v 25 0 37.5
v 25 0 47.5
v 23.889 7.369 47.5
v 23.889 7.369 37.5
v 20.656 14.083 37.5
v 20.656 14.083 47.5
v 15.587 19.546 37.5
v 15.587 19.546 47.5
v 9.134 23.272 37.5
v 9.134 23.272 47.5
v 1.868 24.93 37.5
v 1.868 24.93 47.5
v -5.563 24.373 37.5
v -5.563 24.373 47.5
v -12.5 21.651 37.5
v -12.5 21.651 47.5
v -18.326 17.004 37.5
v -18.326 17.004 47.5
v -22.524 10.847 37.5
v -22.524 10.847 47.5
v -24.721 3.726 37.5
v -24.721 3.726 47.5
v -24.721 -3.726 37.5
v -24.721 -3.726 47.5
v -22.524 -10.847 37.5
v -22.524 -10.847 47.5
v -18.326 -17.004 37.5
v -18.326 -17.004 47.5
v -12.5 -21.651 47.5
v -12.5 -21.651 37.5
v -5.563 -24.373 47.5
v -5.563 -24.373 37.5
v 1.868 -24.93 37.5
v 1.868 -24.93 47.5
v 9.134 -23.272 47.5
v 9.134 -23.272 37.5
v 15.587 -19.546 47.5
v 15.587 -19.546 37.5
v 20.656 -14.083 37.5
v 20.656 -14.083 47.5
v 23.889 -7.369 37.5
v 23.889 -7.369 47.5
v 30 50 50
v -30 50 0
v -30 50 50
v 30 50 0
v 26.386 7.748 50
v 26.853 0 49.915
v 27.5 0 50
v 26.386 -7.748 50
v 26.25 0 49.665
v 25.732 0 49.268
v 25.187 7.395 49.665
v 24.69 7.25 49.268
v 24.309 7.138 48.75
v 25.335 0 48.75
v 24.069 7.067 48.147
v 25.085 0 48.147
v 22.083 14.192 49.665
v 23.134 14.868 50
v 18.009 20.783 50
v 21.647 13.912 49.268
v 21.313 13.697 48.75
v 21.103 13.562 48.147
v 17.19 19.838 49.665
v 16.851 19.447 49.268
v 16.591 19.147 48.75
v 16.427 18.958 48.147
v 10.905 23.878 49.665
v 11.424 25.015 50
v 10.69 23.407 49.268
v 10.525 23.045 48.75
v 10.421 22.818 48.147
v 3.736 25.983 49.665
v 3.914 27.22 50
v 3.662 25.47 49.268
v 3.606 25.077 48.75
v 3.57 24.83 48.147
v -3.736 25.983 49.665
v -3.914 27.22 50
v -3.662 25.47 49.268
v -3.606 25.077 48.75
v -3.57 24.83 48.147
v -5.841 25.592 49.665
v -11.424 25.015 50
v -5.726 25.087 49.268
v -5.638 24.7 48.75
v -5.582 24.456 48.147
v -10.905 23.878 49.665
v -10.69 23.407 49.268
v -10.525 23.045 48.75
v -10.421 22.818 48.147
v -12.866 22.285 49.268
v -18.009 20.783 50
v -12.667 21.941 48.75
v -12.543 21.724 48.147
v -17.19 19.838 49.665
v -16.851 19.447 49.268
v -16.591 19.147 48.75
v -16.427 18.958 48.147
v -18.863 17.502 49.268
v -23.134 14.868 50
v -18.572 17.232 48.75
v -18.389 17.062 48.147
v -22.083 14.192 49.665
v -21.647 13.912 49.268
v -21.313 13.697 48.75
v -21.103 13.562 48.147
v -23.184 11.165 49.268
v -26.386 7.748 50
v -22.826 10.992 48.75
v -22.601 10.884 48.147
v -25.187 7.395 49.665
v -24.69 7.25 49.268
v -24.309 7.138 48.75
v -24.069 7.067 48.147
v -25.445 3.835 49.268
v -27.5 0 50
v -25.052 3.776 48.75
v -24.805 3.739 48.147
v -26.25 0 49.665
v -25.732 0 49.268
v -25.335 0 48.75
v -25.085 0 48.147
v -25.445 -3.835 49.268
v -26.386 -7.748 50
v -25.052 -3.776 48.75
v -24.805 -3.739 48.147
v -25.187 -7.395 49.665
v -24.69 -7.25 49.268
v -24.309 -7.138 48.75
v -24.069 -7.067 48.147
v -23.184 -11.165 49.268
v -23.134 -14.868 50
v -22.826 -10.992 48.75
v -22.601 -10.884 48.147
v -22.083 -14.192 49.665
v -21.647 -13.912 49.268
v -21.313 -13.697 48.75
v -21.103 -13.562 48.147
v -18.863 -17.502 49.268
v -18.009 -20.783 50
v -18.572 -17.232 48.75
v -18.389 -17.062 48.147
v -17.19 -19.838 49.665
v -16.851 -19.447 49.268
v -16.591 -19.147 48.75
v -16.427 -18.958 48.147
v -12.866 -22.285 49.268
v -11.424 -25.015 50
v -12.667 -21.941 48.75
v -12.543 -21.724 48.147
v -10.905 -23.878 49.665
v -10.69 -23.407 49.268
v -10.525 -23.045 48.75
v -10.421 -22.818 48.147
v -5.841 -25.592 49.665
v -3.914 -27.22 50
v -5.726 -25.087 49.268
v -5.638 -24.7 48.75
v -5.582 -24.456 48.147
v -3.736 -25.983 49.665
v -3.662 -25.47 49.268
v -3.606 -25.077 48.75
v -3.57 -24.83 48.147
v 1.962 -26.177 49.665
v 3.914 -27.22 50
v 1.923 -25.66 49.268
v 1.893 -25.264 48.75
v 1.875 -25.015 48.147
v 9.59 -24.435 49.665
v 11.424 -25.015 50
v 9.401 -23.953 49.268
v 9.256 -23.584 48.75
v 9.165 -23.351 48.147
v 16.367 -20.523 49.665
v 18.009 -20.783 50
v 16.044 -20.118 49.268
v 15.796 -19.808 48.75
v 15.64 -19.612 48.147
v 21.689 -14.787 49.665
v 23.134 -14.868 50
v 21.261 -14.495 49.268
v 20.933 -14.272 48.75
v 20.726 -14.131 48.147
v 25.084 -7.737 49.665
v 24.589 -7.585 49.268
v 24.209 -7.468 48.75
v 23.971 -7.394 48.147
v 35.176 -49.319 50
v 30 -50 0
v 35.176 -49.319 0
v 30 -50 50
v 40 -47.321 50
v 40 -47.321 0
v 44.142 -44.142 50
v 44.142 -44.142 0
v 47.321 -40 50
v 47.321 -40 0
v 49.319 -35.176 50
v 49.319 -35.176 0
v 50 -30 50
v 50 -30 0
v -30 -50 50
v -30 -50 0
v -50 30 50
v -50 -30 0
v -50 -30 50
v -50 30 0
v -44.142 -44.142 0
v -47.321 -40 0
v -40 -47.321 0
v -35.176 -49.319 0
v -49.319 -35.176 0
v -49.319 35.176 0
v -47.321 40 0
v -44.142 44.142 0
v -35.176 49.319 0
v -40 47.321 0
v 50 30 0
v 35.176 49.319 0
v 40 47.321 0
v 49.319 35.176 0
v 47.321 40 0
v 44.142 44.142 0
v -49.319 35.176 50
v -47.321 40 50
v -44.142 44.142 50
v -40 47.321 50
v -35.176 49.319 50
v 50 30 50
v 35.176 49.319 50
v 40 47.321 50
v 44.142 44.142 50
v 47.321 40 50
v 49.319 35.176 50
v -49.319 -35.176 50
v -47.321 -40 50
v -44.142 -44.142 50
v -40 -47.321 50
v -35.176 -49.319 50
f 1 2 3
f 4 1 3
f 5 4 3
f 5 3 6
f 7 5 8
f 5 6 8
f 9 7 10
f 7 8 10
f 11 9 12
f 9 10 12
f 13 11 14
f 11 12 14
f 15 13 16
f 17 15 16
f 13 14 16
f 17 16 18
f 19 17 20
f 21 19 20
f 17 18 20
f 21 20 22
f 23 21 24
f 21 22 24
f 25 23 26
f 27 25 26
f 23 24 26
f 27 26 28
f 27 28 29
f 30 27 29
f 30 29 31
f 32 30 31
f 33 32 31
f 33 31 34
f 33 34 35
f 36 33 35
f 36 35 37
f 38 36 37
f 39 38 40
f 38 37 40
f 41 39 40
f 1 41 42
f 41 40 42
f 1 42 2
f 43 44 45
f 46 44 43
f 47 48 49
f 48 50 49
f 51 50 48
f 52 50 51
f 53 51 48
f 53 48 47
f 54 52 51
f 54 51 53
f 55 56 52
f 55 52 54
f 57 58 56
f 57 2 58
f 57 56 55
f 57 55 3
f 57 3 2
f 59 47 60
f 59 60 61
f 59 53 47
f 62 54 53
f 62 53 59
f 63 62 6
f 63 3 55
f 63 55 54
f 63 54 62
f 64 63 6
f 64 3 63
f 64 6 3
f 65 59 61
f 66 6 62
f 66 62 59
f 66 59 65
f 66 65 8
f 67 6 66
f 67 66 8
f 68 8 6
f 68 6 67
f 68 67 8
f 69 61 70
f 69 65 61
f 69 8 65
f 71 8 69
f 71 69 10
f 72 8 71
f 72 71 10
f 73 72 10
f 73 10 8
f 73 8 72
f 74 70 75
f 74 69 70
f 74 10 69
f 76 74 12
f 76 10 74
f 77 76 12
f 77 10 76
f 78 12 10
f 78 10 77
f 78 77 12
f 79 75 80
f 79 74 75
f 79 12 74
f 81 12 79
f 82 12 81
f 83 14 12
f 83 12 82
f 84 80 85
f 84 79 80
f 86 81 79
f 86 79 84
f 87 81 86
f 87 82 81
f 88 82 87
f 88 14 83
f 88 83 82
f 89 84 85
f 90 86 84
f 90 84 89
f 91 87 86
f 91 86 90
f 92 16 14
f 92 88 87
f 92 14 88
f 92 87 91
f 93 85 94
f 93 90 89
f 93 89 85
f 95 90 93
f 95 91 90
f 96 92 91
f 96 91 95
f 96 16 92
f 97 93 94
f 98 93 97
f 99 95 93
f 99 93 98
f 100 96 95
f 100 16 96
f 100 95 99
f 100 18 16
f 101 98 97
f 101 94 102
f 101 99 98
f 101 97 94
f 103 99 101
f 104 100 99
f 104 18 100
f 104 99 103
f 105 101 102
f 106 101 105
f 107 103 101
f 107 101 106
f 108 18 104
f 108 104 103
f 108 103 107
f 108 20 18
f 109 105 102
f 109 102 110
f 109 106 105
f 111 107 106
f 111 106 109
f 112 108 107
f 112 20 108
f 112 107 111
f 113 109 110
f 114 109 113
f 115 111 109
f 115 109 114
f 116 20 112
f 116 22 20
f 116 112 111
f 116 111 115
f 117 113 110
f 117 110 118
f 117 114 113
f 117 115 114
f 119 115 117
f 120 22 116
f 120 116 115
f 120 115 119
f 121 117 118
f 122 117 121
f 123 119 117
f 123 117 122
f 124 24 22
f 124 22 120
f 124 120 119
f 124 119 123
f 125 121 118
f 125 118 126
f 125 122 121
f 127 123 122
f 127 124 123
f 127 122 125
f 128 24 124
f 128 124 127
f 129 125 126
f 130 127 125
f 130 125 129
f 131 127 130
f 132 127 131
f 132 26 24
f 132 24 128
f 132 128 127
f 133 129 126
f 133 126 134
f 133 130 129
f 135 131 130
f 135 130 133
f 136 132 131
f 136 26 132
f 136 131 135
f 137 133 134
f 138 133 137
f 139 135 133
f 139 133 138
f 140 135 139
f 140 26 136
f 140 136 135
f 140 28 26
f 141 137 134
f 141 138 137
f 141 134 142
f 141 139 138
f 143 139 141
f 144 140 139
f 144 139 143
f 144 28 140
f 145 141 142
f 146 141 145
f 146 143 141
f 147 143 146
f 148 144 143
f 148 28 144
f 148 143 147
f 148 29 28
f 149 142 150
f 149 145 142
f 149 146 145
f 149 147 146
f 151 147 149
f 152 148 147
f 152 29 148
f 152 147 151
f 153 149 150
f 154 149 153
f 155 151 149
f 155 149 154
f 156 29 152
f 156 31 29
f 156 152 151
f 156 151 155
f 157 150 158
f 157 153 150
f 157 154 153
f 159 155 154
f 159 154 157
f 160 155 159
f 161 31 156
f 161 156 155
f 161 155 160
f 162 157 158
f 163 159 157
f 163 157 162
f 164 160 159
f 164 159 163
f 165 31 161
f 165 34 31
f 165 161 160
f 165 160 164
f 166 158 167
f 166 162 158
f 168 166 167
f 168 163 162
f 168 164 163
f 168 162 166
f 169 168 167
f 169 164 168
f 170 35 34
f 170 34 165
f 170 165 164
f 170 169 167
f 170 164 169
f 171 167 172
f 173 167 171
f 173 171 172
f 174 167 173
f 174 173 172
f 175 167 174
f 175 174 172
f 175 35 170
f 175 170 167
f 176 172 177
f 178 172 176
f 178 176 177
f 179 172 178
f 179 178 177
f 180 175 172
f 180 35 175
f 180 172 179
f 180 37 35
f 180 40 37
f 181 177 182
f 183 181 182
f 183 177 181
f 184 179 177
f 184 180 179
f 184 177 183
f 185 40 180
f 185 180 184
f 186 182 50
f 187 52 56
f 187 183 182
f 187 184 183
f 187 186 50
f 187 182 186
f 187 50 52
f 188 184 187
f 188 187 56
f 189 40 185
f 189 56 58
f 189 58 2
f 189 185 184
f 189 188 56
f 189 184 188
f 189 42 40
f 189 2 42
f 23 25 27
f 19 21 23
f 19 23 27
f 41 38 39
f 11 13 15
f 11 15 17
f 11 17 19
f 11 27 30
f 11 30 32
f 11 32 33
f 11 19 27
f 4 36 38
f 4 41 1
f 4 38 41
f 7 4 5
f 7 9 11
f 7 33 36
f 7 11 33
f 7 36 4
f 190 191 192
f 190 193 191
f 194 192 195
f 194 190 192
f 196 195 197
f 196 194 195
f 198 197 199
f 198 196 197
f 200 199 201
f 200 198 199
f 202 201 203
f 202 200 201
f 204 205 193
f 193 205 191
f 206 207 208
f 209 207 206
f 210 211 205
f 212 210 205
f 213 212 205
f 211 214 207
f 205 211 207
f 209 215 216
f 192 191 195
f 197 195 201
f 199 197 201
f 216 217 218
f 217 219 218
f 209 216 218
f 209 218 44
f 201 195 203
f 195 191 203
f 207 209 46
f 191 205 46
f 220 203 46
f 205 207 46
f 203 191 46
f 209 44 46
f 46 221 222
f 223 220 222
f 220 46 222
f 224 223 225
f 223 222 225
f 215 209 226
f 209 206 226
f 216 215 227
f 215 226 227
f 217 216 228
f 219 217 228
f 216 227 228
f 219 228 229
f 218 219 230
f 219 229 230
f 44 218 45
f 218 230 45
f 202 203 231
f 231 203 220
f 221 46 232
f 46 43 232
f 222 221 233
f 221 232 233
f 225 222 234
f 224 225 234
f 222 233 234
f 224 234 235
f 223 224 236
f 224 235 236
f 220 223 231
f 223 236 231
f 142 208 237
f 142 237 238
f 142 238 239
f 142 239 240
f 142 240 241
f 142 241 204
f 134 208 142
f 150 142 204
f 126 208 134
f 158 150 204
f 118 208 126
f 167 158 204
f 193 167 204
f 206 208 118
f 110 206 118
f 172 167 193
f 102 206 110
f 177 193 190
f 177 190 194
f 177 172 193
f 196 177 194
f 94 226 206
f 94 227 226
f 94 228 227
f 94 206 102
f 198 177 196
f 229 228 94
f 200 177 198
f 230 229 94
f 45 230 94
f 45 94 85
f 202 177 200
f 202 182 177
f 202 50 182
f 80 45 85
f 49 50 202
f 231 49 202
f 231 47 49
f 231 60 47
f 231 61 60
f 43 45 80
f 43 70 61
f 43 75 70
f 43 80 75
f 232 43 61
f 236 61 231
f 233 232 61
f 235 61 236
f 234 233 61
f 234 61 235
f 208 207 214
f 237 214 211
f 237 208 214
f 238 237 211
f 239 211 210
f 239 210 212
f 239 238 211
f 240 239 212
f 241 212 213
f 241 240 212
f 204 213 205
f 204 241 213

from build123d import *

# Parameters (mm, degrees)
SKETCH_W     = 100
SKETCH_H     = 100
PAD_DEPTH    = 50
SKETCH001_R  = 25
POCKET_DEPTH = 12.5
FILLET_R     = 20
FILLET001_R  = 2.5


with BuildPart() as part:
    # Sketch → Pad (new body)
    with BuildSketch(Plane.XY):
        Rectangle(SKETCH_W, SKETCH_H)
    extrude(amount=PAD_DEPTH)

    # Sketch001 (on Face6 of Pad) → Pocket (cut)
    with BuildSketch(Plane.XY.offset(50)):
        Circle(SKETCH001_R)
    extrude(amount=-POCKET_DEPTH, mode=Mode.SUBTRACT)

    # Fillet
    fillet_edges = [part.edges().sort_by_distance(p)[0] for p in [
        (50, -50, 25),
        (50, 50, 25),
        (-50, 50, 25),
        (-50, -50, 25),
    ]]
    fillet(fillet_edges, radius=FILLET_R)

    # Fillet001
    fillet001_edges = [part.edges().sort_by_distance(p)[0] for p in [
        (-25, 0, 50),
    ]]
    fillet(fillet001_edges, radius=FILLET001_R)


solid = part.part
